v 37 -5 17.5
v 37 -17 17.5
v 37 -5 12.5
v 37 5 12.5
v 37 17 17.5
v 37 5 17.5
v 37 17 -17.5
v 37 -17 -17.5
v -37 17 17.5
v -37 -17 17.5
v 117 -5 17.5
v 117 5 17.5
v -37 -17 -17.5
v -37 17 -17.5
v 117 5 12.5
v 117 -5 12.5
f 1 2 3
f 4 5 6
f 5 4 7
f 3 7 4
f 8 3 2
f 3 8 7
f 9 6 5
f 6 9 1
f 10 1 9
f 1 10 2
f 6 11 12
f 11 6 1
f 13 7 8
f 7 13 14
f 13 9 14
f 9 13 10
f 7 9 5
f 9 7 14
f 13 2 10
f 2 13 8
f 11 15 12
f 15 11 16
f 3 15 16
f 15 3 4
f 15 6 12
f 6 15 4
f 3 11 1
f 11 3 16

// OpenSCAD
module lipo_battery() {
    length = 74;
    height = 35;
    width = 34;
    tail_len = 80;
    tail_width = 10;
    tail_thickness = 5;
    translate([-length/2, -width/2, -height/2]){
        cube([length, width, height]);
        translate([length, width/2-tail_width/2, height-tail_thickness])
            cube([tail_len, tail_width, tail_thickness]);
    }
}

lipo_battery();
